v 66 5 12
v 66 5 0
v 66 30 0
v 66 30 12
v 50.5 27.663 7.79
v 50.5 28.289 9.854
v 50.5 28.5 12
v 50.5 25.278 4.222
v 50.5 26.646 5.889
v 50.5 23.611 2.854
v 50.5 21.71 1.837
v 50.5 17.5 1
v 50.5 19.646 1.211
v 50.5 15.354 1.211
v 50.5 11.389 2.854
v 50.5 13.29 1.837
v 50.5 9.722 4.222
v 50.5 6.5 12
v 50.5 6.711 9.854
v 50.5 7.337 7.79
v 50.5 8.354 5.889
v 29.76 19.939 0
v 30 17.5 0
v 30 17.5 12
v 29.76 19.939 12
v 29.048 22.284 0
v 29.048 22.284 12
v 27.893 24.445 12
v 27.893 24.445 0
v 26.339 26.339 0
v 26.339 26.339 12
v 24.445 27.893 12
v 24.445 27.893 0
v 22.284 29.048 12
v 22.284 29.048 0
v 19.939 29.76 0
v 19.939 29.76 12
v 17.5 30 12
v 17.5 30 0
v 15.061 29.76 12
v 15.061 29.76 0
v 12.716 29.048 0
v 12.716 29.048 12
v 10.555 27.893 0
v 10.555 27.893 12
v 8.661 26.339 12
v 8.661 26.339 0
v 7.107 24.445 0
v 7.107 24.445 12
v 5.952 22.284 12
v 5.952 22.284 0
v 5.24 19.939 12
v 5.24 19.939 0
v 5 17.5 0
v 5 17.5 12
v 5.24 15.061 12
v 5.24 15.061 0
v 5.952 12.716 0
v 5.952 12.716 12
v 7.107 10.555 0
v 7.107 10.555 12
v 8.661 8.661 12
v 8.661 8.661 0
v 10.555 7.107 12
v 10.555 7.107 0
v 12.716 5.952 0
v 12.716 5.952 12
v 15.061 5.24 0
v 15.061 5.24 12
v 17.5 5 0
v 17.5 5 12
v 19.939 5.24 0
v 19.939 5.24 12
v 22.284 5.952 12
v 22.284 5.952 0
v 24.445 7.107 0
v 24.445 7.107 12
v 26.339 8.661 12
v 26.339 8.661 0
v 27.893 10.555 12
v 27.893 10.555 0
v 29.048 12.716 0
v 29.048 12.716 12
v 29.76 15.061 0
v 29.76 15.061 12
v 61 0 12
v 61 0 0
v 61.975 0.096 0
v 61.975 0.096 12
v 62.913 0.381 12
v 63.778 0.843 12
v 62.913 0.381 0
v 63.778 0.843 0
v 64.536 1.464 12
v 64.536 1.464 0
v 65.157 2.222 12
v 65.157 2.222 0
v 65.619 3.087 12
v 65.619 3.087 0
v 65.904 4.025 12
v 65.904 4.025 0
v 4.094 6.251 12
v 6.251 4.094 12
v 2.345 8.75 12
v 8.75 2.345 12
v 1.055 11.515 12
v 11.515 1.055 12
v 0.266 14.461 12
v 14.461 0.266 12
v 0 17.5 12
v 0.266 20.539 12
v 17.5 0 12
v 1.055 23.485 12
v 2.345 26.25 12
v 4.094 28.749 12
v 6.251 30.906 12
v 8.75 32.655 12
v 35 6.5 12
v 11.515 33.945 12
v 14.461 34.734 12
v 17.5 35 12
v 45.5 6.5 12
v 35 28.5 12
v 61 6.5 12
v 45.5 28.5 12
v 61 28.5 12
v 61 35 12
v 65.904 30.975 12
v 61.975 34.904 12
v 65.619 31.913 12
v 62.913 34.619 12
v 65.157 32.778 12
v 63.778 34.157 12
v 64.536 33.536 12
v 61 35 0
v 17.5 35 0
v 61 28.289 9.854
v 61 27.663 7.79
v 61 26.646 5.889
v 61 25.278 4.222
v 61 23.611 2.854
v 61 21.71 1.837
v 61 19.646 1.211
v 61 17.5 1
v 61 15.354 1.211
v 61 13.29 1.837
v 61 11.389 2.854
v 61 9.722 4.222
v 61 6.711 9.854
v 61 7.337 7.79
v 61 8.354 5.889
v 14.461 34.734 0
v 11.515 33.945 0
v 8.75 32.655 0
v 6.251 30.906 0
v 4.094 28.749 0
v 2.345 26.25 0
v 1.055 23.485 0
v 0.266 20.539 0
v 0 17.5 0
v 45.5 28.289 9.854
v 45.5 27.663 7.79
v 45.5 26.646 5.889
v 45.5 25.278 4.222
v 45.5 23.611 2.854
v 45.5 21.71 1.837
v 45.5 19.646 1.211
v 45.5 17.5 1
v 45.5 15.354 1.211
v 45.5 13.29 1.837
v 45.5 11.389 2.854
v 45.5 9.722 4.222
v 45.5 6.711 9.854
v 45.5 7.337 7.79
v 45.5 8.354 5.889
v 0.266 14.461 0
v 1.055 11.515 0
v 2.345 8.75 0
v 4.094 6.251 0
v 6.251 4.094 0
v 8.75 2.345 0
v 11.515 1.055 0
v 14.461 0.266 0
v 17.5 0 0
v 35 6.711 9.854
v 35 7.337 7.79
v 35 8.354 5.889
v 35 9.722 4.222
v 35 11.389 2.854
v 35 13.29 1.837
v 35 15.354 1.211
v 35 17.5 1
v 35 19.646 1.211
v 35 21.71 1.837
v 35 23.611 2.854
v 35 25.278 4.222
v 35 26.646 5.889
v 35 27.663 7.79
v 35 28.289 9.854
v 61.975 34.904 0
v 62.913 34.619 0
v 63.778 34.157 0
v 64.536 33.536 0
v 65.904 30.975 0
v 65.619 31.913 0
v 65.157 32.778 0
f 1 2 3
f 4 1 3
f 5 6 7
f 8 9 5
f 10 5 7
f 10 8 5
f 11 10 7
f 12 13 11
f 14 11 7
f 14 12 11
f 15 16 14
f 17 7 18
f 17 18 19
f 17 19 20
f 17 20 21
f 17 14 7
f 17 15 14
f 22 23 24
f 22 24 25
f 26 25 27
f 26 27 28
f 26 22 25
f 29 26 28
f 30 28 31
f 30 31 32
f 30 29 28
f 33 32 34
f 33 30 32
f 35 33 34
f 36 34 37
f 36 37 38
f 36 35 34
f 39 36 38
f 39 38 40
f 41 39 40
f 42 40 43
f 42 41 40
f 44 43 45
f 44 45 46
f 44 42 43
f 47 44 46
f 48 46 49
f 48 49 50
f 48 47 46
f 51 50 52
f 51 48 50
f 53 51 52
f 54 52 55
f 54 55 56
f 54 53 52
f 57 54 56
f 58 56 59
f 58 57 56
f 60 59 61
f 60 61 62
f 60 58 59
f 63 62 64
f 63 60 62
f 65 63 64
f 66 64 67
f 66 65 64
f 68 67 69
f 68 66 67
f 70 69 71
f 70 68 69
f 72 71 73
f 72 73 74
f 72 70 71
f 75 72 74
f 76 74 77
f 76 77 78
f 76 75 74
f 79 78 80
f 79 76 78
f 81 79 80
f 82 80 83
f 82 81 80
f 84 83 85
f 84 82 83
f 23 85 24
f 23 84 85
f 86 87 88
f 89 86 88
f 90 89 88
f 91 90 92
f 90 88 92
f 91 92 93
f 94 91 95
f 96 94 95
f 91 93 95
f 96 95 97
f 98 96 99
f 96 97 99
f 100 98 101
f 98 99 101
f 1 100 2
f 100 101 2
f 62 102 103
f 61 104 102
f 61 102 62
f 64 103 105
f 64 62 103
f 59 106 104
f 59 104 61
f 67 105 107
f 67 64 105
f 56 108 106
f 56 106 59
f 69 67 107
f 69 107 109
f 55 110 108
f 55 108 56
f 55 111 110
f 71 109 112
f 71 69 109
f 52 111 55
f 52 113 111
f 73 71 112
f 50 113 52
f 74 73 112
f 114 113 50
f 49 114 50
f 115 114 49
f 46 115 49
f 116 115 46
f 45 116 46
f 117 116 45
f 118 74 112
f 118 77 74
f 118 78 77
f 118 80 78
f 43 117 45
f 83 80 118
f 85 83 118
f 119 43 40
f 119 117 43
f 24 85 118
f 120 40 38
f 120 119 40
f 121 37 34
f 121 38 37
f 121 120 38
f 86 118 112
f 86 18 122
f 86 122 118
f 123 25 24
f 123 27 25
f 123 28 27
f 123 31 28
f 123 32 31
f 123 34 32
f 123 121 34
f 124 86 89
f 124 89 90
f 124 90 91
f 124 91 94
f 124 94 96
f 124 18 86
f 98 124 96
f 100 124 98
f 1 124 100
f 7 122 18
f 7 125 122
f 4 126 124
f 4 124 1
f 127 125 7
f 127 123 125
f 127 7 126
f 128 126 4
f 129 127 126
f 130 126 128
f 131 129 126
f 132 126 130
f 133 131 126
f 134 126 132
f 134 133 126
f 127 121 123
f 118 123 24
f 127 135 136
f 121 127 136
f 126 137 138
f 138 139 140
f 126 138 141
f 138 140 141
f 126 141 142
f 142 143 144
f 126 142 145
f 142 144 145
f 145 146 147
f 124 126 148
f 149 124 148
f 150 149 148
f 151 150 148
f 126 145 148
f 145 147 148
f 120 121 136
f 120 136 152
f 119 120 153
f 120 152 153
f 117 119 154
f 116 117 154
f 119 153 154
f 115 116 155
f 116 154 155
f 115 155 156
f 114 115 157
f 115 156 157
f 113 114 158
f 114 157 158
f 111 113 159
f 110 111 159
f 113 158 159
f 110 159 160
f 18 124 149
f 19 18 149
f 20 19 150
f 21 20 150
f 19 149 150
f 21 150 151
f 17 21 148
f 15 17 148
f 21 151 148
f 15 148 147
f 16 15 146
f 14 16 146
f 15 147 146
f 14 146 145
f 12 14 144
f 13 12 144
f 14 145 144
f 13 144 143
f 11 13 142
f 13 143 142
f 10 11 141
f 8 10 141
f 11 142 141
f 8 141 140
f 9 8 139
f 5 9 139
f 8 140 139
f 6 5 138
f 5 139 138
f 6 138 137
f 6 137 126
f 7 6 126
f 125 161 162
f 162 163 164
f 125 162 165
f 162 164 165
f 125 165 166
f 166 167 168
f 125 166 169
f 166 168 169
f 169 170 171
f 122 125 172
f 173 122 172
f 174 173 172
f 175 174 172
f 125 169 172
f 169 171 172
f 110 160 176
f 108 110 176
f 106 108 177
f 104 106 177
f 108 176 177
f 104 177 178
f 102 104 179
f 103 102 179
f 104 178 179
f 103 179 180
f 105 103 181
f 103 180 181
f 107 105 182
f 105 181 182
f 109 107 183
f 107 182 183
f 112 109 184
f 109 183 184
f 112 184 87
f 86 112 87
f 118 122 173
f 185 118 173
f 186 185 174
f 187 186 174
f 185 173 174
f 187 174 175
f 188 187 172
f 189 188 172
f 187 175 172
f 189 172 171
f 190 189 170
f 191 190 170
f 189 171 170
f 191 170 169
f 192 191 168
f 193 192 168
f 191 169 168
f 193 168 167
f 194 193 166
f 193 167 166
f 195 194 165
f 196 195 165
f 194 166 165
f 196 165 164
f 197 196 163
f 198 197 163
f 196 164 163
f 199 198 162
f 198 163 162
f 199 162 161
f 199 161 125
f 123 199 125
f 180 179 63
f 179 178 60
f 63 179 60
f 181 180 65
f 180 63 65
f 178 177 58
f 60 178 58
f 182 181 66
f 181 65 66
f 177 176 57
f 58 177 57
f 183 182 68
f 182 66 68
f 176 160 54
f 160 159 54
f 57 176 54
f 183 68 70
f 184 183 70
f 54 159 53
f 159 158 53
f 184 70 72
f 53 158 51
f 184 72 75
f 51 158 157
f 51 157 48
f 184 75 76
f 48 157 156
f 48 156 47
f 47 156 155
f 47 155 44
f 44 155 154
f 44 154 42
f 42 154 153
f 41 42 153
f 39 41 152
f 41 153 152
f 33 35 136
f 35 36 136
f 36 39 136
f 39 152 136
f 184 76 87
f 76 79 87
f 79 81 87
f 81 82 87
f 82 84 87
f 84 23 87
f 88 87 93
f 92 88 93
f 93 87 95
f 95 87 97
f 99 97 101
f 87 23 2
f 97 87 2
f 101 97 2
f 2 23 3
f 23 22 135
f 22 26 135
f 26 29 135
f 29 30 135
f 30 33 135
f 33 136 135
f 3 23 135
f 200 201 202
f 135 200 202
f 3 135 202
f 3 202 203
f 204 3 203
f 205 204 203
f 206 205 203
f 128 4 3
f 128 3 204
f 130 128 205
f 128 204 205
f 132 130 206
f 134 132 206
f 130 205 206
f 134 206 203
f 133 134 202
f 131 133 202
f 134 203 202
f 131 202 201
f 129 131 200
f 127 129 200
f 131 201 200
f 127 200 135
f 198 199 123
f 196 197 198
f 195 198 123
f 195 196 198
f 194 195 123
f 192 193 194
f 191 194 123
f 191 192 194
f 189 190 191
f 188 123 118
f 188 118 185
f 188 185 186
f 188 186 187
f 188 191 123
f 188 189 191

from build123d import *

# Parameters (mm, degrees)
F0_R     = 12.5
F1_DEPTH = 12
F2_W     = 10.5
F2_H     = 11


with BuildPart() as f1:
    # F0 (on Top) → F1 (new body)
    with BuildSketch(Plane.XY):
        with BuildLine():
            ThreePointArc((0, 17.5), (5.125631, 5.125631), (17.5, 0))
            Line((17.5, 0), (61, 0))
            ThreePointArc((61, 0), (64.535534, 1.464466), (66, 5))
            Line((66, 5), (66, 30))
            ThreePointArc((66, 30), (64.535534, 33.535534), (61, 35))
            Line((61, 35), (17.5, 35))
            ThreePointArc((17.5, 35), (5.125631, 29.874369), (0, 17.5))
        make_face()
        with Locations((17.5, 17.5)):
            Circle(F0_R, mode=Mode.SUBTRACT)
    extrude(amount=F1_DEPTH)

    # F2 (on face) → F3 (revolve, cut)
    with BuildSketch(Plane.XY.offset(12)):
        with Locations((40.25, 12)):
            Rectangle(F2_W, F2_H)
        with Locations((55.75, 12)):
            Rectangle(F2_W, F2_H)
    revolve(axis=Axis((40.25, 17.5, 12), (1, 0, 0)), mode=Mode.SUBTRACT)


solid = f1.part
